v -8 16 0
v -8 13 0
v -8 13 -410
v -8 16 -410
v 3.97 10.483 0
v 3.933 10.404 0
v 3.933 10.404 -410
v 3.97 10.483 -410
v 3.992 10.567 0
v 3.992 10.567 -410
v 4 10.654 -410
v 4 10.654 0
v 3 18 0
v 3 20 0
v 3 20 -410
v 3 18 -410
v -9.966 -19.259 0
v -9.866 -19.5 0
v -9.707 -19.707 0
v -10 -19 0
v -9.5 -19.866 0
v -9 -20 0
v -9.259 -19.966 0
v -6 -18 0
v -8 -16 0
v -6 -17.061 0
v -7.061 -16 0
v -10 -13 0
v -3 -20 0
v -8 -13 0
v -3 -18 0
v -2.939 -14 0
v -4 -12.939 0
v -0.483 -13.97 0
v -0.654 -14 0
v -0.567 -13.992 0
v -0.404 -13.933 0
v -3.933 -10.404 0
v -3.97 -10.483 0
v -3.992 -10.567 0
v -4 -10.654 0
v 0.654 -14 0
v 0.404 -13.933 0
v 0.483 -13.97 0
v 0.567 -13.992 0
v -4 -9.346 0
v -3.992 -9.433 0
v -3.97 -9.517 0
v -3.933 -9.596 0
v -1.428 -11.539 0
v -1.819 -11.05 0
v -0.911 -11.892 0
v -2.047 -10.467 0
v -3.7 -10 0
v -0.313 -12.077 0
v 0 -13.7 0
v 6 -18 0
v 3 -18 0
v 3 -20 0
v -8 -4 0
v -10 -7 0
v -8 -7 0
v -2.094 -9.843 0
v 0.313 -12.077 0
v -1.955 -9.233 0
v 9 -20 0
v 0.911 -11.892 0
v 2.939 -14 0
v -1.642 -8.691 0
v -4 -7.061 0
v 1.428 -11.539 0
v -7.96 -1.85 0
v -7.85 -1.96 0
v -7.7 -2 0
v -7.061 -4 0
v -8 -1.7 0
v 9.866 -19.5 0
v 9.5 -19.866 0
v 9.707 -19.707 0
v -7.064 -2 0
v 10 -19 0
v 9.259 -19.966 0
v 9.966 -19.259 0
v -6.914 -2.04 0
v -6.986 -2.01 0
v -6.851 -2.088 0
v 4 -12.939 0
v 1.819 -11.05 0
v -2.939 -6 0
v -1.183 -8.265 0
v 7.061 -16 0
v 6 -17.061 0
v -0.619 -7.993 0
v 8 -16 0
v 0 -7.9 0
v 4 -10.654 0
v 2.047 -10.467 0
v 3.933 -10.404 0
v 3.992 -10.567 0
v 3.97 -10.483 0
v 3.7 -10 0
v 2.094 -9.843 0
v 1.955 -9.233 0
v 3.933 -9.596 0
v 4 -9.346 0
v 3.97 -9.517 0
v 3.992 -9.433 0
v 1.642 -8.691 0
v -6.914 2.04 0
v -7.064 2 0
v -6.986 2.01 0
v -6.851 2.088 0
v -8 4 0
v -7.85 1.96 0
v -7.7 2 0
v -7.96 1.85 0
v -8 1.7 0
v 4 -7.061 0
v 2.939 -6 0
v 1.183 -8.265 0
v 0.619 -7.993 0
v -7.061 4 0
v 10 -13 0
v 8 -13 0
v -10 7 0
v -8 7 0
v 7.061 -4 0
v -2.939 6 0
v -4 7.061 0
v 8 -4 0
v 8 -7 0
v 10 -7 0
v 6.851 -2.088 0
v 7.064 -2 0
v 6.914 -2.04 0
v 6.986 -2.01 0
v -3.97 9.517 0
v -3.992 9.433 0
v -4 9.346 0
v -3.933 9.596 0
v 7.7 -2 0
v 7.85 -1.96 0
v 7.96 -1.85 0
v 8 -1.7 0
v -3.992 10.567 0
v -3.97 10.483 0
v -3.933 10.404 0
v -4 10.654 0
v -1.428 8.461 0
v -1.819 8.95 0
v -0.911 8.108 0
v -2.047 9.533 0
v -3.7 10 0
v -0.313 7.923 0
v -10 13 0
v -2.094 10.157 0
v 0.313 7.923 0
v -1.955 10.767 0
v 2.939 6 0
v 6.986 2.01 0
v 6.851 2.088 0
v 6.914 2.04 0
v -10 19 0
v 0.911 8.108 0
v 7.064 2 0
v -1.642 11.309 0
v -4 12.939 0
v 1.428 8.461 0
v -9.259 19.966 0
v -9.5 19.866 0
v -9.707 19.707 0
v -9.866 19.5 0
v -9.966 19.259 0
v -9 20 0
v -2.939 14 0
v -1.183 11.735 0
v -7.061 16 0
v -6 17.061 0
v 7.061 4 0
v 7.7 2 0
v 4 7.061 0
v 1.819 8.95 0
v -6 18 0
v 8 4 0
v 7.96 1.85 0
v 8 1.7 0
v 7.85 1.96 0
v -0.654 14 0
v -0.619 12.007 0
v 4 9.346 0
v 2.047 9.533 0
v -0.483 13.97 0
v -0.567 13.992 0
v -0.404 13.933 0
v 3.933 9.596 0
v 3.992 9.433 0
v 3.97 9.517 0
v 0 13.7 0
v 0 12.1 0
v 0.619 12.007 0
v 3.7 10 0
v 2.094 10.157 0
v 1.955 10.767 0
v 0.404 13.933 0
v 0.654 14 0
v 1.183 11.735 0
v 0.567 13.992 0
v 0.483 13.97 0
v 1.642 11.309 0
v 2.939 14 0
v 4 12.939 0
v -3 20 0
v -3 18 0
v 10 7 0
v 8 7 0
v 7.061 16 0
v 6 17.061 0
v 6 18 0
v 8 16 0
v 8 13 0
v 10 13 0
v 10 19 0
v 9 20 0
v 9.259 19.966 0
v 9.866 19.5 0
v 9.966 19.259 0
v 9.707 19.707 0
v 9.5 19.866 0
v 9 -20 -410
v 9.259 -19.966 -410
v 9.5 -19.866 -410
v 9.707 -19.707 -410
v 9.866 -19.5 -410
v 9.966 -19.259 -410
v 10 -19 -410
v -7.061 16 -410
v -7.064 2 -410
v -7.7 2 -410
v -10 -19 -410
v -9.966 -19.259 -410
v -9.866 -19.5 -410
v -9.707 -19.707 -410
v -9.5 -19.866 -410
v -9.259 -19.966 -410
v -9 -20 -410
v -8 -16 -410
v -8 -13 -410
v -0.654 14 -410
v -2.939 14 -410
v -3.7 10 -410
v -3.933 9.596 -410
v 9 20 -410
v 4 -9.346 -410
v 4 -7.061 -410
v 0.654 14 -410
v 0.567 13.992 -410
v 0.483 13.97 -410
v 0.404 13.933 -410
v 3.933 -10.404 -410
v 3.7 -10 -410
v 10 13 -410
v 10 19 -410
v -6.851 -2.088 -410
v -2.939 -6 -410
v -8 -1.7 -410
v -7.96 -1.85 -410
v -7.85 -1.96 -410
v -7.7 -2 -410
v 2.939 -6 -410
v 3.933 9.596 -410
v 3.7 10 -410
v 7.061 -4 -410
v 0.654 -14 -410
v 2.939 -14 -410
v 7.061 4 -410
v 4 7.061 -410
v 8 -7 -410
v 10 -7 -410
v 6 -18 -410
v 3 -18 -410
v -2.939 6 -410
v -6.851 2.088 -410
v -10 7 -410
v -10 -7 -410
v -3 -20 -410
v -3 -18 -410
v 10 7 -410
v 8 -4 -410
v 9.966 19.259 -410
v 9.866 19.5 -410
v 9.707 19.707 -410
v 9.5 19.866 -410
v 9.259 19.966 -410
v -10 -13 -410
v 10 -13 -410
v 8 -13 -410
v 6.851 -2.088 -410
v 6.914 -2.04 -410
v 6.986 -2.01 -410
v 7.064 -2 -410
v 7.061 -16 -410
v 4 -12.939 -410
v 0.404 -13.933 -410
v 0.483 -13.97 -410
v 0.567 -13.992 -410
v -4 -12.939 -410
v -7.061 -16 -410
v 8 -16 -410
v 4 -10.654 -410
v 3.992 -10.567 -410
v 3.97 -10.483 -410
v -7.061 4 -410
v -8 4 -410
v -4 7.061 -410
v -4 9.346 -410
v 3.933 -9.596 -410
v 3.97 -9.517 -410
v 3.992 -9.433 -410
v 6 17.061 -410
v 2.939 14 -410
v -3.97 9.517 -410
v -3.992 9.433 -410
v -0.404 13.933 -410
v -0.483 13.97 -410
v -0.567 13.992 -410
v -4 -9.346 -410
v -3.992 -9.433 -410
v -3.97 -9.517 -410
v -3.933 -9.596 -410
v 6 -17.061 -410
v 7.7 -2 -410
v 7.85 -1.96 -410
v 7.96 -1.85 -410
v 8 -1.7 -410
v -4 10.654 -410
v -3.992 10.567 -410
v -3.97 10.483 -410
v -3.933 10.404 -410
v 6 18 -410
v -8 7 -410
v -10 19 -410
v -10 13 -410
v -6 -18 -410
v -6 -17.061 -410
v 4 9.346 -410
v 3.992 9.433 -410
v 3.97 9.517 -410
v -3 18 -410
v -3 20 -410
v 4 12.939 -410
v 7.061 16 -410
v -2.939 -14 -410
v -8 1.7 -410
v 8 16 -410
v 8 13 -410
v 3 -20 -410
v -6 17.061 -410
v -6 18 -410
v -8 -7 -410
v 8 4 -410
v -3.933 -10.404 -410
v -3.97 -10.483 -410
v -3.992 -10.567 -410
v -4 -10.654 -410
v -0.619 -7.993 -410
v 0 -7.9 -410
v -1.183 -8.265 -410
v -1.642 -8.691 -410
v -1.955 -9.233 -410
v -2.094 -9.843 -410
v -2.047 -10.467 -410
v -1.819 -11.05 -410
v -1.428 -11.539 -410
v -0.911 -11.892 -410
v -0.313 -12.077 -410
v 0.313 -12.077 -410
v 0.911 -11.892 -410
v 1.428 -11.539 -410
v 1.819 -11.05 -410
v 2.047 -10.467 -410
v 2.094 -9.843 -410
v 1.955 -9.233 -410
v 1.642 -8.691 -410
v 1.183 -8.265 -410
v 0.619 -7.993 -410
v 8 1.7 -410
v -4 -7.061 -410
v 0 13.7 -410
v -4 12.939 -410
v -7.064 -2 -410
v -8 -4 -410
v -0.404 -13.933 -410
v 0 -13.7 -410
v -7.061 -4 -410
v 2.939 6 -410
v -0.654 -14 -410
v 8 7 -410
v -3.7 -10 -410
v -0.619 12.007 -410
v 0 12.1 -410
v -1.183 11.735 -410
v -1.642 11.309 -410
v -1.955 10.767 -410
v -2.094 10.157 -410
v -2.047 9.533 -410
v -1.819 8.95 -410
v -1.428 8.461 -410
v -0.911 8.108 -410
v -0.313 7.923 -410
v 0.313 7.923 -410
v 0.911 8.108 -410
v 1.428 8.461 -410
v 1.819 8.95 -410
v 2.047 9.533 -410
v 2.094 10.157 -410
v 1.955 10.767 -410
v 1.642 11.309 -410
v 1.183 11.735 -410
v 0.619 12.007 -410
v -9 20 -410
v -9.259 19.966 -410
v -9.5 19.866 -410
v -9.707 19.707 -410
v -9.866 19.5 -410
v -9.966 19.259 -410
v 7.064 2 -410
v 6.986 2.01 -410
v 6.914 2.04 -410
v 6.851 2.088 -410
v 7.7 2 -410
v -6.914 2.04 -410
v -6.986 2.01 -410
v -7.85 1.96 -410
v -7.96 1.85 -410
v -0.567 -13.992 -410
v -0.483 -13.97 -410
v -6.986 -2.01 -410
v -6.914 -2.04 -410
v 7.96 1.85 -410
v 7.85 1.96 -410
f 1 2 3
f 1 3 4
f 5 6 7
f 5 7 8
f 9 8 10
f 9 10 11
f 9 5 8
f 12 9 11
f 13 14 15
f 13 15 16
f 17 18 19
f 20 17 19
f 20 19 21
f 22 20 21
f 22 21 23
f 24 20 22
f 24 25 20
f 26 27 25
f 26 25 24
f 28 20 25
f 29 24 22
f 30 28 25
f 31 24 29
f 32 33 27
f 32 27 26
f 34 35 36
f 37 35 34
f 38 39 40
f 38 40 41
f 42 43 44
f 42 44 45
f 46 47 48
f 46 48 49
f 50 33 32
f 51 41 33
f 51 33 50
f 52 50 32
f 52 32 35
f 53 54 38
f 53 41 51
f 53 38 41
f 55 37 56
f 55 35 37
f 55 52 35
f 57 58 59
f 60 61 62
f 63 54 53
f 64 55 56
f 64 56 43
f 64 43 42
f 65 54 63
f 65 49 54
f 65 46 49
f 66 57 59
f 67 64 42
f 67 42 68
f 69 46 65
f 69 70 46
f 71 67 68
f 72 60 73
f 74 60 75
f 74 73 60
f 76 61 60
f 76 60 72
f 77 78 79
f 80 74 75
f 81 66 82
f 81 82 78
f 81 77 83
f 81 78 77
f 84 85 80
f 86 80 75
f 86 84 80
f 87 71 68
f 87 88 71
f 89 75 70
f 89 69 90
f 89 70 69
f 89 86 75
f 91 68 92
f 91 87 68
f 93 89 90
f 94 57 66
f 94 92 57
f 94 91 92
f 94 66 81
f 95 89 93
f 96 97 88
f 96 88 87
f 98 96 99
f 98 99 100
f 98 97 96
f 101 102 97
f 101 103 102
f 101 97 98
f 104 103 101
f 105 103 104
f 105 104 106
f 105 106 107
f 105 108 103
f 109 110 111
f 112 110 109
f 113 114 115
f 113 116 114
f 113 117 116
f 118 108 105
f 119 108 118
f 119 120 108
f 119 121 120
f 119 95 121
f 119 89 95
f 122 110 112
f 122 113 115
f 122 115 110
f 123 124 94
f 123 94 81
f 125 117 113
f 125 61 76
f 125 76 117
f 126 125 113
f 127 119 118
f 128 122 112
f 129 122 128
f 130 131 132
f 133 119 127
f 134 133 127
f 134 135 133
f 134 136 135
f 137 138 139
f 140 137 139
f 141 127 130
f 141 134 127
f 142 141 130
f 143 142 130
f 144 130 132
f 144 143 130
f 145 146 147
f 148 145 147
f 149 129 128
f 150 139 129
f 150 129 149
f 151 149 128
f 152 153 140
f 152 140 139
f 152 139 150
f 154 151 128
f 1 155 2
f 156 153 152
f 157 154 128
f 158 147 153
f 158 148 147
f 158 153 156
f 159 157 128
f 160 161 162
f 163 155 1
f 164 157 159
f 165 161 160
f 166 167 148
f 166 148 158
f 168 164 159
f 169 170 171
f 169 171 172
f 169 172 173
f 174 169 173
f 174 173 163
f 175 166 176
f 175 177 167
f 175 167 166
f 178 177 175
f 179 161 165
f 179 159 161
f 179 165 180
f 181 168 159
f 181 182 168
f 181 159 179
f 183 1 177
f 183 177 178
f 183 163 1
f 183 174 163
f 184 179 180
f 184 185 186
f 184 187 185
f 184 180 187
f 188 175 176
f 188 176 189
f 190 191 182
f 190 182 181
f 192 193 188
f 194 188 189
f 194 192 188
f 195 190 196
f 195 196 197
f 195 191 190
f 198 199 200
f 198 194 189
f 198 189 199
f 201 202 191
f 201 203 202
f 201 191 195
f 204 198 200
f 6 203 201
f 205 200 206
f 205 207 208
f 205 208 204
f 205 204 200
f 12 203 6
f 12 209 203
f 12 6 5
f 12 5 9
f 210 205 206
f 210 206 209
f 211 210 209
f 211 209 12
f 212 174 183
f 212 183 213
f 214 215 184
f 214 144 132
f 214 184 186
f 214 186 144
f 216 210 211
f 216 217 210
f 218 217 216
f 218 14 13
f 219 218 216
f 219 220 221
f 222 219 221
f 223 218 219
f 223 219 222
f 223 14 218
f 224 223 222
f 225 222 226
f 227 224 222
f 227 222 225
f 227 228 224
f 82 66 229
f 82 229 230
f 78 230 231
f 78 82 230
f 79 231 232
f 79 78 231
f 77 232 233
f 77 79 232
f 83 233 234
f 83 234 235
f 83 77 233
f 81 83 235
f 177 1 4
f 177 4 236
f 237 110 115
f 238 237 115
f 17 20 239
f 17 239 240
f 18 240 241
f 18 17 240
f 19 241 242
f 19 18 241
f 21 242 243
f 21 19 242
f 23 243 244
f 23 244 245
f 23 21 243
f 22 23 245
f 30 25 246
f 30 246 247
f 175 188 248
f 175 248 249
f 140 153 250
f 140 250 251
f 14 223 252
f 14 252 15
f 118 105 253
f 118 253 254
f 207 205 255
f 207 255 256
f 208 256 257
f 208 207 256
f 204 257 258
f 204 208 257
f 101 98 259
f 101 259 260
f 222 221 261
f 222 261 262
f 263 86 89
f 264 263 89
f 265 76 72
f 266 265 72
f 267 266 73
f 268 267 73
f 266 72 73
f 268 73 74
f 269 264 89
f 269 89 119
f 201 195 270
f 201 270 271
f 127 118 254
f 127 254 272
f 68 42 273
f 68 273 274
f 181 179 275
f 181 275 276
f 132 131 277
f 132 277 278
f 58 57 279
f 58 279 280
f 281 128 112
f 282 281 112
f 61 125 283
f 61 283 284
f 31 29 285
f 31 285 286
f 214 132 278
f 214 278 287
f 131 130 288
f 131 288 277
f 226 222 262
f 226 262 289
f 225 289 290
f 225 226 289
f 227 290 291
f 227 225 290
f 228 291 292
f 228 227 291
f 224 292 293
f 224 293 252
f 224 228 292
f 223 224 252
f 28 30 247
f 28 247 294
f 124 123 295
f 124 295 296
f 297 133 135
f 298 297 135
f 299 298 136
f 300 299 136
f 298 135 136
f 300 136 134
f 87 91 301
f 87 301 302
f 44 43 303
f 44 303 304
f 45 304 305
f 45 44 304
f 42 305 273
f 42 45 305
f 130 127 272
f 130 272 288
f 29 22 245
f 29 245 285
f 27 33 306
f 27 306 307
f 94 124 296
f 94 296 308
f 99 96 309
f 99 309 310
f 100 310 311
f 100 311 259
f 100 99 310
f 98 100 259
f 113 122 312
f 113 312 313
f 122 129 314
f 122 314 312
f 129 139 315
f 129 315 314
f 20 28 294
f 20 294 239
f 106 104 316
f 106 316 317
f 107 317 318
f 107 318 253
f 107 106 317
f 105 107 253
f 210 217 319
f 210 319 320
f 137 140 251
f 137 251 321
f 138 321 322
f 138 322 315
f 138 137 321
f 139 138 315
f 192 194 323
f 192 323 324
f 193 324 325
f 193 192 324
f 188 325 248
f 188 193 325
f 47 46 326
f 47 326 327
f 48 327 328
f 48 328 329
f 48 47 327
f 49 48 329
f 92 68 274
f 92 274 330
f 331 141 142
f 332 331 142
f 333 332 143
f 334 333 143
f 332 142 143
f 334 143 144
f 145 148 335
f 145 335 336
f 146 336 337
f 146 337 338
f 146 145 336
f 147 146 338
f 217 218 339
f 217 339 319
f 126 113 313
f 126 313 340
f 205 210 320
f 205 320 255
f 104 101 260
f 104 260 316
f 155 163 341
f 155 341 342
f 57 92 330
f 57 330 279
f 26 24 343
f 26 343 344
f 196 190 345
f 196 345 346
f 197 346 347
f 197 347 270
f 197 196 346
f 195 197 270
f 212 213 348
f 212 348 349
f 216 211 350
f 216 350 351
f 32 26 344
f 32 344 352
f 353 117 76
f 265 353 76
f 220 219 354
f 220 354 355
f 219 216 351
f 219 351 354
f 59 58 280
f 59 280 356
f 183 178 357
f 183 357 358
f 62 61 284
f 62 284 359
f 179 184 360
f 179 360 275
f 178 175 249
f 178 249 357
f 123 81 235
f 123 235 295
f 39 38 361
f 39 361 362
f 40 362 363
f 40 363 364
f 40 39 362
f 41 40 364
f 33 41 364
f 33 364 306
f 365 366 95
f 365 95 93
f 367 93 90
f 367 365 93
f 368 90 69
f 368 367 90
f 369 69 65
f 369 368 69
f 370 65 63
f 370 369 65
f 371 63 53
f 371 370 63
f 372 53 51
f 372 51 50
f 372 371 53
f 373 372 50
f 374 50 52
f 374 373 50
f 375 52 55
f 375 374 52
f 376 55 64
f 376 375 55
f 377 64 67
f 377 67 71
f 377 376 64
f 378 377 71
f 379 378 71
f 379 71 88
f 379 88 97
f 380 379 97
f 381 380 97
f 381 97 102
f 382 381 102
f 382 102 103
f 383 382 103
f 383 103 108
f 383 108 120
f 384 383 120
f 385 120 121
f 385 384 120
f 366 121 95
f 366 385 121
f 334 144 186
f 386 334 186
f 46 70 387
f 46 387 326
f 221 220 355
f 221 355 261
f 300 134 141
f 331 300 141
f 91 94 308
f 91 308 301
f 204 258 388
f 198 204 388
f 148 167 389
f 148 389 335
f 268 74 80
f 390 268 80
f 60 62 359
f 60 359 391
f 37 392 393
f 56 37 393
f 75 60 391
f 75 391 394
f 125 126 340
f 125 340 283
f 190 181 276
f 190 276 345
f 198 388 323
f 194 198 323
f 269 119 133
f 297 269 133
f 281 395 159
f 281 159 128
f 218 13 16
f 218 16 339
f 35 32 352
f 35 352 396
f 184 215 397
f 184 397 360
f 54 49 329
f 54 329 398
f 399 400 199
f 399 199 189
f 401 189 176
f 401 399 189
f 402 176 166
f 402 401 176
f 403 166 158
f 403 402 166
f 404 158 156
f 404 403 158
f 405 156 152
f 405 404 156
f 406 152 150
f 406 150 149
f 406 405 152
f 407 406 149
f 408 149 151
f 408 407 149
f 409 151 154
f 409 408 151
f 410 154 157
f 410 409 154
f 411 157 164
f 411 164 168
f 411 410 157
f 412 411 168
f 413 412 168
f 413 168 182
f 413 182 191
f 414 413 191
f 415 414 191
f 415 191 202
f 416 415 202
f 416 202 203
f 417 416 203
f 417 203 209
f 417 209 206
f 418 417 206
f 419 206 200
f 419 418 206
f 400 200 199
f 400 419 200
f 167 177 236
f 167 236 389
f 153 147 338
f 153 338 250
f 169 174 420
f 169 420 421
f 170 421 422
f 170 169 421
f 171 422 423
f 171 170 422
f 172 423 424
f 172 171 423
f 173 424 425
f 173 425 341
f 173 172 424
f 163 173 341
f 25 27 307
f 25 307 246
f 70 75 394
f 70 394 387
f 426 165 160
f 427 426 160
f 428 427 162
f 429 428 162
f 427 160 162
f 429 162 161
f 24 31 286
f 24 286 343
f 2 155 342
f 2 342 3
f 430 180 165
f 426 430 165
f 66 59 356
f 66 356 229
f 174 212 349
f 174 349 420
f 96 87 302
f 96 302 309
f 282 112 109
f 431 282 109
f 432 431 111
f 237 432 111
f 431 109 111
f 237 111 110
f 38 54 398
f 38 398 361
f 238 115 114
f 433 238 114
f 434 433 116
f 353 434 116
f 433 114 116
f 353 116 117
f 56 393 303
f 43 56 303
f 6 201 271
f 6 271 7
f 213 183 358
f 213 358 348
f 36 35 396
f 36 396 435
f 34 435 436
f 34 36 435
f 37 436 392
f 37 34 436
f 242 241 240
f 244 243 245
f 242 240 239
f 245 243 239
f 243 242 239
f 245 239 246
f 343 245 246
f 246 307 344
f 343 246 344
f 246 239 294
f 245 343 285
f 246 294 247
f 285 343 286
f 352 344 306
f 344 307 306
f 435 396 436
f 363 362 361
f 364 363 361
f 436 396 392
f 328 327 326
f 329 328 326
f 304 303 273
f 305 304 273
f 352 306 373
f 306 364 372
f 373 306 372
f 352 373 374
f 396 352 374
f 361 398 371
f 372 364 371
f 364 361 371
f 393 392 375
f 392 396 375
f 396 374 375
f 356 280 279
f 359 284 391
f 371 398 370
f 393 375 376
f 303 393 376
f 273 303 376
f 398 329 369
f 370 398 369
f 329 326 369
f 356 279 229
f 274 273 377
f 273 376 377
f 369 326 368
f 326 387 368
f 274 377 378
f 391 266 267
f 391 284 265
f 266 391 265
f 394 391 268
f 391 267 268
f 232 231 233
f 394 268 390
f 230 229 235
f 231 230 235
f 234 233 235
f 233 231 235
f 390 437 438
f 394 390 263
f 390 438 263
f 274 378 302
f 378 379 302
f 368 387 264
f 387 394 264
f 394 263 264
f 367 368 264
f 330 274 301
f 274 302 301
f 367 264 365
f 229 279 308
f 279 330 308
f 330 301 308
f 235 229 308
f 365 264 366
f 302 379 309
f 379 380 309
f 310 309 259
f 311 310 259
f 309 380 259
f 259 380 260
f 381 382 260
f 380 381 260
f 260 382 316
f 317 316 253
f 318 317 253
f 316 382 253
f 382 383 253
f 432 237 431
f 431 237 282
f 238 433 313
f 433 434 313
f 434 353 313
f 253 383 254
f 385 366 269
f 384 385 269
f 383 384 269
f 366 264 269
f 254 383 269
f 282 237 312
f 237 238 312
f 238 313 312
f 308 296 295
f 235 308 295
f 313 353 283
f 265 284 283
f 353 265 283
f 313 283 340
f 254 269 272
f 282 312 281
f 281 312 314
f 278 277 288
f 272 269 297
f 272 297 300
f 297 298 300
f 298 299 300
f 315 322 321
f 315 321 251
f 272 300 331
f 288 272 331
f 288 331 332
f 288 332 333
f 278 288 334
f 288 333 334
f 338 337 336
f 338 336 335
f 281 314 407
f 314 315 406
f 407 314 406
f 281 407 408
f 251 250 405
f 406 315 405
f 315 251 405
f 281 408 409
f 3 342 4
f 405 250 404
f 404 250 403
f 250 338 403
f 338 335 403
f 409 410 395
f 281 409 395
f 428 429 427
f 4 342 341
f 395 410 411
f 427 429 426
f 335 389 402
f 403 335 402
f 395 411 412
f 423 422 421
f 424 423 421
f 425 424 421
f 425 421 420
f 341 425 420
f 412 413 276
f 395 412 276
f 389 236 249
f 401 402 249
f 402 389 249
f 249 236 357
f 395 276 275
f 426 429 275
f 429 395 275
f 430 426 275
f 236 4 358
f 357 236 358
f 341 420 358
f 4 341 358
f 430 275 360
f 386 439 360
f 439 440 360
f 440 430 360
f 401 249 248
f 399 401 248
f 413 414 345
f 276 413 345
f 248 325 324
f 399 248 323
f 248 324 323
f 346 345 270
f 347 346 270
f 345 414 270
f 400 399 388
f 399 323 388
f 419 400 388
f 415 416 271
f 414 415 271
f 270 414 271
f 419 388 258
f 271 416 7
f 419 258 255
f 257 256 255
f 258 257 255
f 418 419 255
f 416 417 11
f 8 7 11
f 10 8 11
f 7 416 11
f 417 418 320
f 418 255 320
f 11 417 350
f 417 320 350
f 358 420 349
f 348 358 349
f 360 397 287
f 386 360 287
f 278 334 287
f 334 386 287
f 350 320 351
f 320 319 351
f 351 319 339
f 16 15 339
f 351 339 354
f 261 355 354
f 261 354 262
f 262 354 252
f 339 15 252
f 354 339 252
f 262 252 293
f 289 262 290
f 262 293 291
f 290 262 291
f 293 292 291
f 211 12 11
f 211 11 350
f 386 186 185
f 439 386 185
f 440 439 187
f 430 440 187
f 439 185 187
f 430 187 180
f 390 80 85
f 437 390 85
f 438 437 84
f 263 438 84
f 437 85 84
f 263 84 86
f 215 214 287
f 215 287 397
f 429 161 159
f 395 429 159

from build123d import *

# Parameters (mm, degrees)
BOSS_EXTRUDE1_DEPTH = 410
SKETCH2_W           = 1200
SKETCH2_H           = 2.1
SKETCH3_W           = 1200
SKETCH3_H           = 2.1


with BuildPart() as part:
    # Sketch1 → Boss-Extrude1 (new body)
    with BuildSketch(Plane.XY):
        with BuildLine():
            Line((-9, -20), (-3, -20))
            Line((-3, -20), (-3, -18))
            Line((-3, -18), (-6, -18))
            Line((-6, -18), (-6, -17.060660172))
            Line((-6, -17.060660172), (-2.939339828, -14))
            Line((-2.939339828, -14), (-2.5, -14))
            Line((-2.5, -14), (-0.653589838, -14))
            ThreePointArc((-0.653589838, -14), (-0.524180316, -13.982962913), (-0.403589838, -13.933012702))
            Line((-0.403589838, -13.933012702), (0, -13.7))
            Line((0, -13.7), (0.403589838, -13.933012702))
            ThreePointArc((0.403589838, -13.933012702), (0.524180316, -13.982962913), (0.653589838, -14))
            Line((0.653589838, -14), (2.939339828, -14))
            Line((2.939339828, -14), (6, -17.060660172))
            Line((6, -17.060660172), (6, -18))
            Line((6, -18), (3, -18))
            Line((3, -18), (3, -20))
            Line((3, -20), (9, -20))
            ThreePointArc((9, -20), (9.707106781, -19.707106781), (10, -19))
            Line((10, -19), (10, -13))
            Line((10, -13), (8, -13))
            Line((8, -13), (8, -16))
            Line((8, -16), (7.060660172, -16))
            Line((7.060660172, -16), (4, -12.939339828))
            Line((4, -12.939339828), (4, -12.5))
            Line((4, -12.5), (4, -10.653589838))
            ThreePointArc((4, -10.653589838), (3.982962913, -10.524180316), (3.933012702, -10.403589838))
            Line((3.933012702, -10.403589838), (3.7, -10))
            Line((3.7, -10), (3.933012702, -9.596410162))
            ThreePointArc((3.933012702, -9.596410162), (3.982962913, -9.475819684), (4, -9.346410162))
            Line((4, -9.346410162), (4, -7.060660172))
            Line((4, -7.060660172), (7.060660172, -4))
            Line((7.060660172, -4), (8, -4))
            Line((8, -4), (8, -7))
            Line((8, -7), (10, -7))
            Line((10, -7), (10, 7))
            Line((10, 7), (8, 7))
            Line((8, 7), (8, 4))
            Line((8, 4), (7.060660172, 4))
            Line((7.060660172, 4), (4, 7.060660172))
            Line((4, 7.060660172), (4, 9.346410162))
            ThreePointArc((4, 9.346410162), (3.982962913, 9.475819684), (3.933012702, 9.596410162))
            Line((3.933012702, 9.596410162), (3.7, 10))
            Line((3.7, 10), (3.933012702, 10.403589838))
            ThreePointArc((3.933012702, 10.403589838), (3.982962913, 10.524180316), (4, 10.653589838))
            Line((4, 10.653589838), (4, 12.5))
            Line((4, 12.5), (4, 12.939339828))
            Line((4, 12.939339828), (7.060660172, 16))
            Line((7.060660172, 16), (8, 16))
            Line((8, 16), (8, 13))
            Line((8, 13), (10, 13))
            Line((10, 13), (10, 19))
            ThreePointArc((10, 19), (9.707106781, 19.707106781), (9, 20))
            Line((9, 20), (3, 20))
            Line((3, 20), (3, 18))
            Line((3, 18), (6, 18))
            Line((6, 18), (6, 17.060660172))
            Line((6, 17.060660172), (2.939339828, 14))
            Line((2.939339828, 14), (0.653589838, 14))
            ThreePointArc((0.653589838, 14), (0.524180316, 13.982962913), (0.403589838, 13.933012702))
            Line((0.403589838, 13.933012702), (0, 13.7))
            Line((0, 13.7), (-0.403589838, 13.933012702))
            ThreePointArc((-0.403589838, 13.933012702), (-0.524180316, 13.982962913), (-0.653589838, 14))
            Line((-0.653589838, 14), (-2.5, 14))
            Line((-2.5, 14), (-2.939339828, 14))
            Line((-2.939339828, 14), (-6, 17.060660172))
            Line((-6, 17.060660172), (-6, 18))
            Line((-6, 18), (-3, 18))
            Line((-3, 18), (-3, 20))
            Line((-3, 20), (-9, 20))
            ThreePointArc((-9, 20), (-9.707106781, 19.707106781), (-10, 19))
            Line((-10, 19), (-10, 13))
            Line((-10, 13), (-8, 13))
            Line((-8, 13), (-8, 16))
            Line((-8, 16), (-7.060660172, 16))
            Line((-7.060660172, 16), (-4, 12.939339828))
            Line((-4, 12.939339828), (-4, 10.653589838))
            ThreePointArc((-4, 10.653589838), (-3.982962913, 10.524180316), (-3.933012702, 10.403589838))
            Line((-3.933012702, 10.403589838), (-3.7, 10))
            Line((-3.7, 10), (-3.933012702, 9.596410162))
            ThreePointArc((-3.933012702, 9.596410162), (-3.982962913, 9.475819684), (-4, 9.346410162))
            Line((-4, 9.346410162), (-4, 7.5))
            Line((-4, 7.5), (-4, 7.060660172))
            Line((-4, 7.060660172), (-7.060660172, 4))
            Line((-7.060660172, 4), (-8, 4))
            Line((-8, 4), (-8, 7))
            Line((-8, 7), (-10, 7))
            Line((-10, 7), (-10, -7))
            Line((-10, -7), (-8, -7))
            Line((-8, -7), (-8, -4))
            Line((-8, -4), (-7.060660172, -4))
            Line((-7.060660172, -4), (-4, -7.060660172))
            Line((-4, -7.060660172), (-4, -7.5))
            Line((-4, -7.5), (-4, -9.346410162))
            ThreePointArc((-4, -9.346410162), (-3.982962913, -9.475819684), (-3.933012702, -9.596410162))
            Line((-3.933012702, -9.596410162), (-3.7, -10))
            Line((-3.7, -10), (-3.933012702, -10.403589838))
            ThreePointArc((-3.933012702, -10.403589838), (-3.982962913, -10.524180316), (-4, -10.653589838))
            Line((-4, -10.653589838), (-4, -12.939339828))
            Line((-4, -12.939339828), (-7.060660172, -16))
            Line((-7.060660172, -16), (-8, -16))
            Line((-8, -16), (-8, -13))
            Line((-8, -13), (-10, -13))
            Line((-10, -13), (-10, -19))
            ThreePointArc((-10, -19), (-9.707106781, -19.707106781), (-9, -20))
        make_face()
        with BuildLine():
            Line((-7.7, -2), (-7.063603897, -2))
            ThreePointArc((-7.063603897, -2), (-6.948798867, -2.02283614), (-6.851471863, -2.087867966))
            Line((-6.851471863, -2.087867966), (-2.939339828, -6))
            Line((-2.939339828, -6), (2.939339828, -6))
            Line((2.939339828, -6), (6.851471863, -2.087867966))
            ThreePointArc((6.851471863, -2.087867966), (6.948798867, -2.02283614), (7.063603897, -2))
            Line((7.063603897, -2), (7.7, -2))
            ThreePointArc((7.7, -2), (7.912132034, -1.912132034), (8, -1.7))
            Line((8, -1.7), (8, 1.7))
            ThreePointArc((8, 1.7), (7.912132034, 1.912132034), (7.7, 2))
            Line((7.7, 2), (7.063603897, 2))
            ThreePointArc((7.063603897, 2), (6.948798867, 2.02283614), (6.851471863, 2.087867966))
            Line((6.851471863, 2.087867966), (2.939339828, 6))
            Line((2.939339828, 6), (-2.939339828, 6))
            Line((-2.939339828, 6), (-6.851471863, 2.087867966))
            ThreePointArc((-6.851471863, 2.087867966), (-6.948798867, 2.02283614), (-7.063603897, 2))
            Line((-7.063603897, 2), (-7.7, 2))
            ThreePointArc((-7.7, 2), (-7.912132034, 1.912132034), (-8, 1.7))
            Line((-8, 1.7), (-8, -1.7))
            ThreePointArc((-8, -1.7), (-7.912132034, -1.912132034), (-7.7, -2))
        make_face(mode=Mode.SUBTRACT)
    extrude(amount=-BOSS_EXTRUDE1_DEPTH)

    # Sketch2 → Cut-Revolve1 (revolve, cut)
    with BuildSketch(Plane(origin=(0, 0, 0), x_dir=(0, 0, -1), z_dir=(1, 0, 0))):
        with Locations((600, 11.05)):
            Rectangle(SKETCH2_W, SKETCH2_H)
    revolve(axis=Axis((0, 10, -1200), (0, 0, 1)), mode=Mode.SUBTRACT)

    # Sketch3 → Cut-Revolve2 (revolve, cut)
    with BuildSketch(Plane(origin=(0, 0, 0), x_dir=(0, 0, -1), z_dir=(1, 0, 0))):
        with Locations((600, -8.95)):
            Rectangle(SKETCH3_W, SKETCH3_H)
    revolve(axis=Axis((0, -10, -1200), (0, 0, 1)), mode=Mode.SUBTRACT)


solid = part.part
